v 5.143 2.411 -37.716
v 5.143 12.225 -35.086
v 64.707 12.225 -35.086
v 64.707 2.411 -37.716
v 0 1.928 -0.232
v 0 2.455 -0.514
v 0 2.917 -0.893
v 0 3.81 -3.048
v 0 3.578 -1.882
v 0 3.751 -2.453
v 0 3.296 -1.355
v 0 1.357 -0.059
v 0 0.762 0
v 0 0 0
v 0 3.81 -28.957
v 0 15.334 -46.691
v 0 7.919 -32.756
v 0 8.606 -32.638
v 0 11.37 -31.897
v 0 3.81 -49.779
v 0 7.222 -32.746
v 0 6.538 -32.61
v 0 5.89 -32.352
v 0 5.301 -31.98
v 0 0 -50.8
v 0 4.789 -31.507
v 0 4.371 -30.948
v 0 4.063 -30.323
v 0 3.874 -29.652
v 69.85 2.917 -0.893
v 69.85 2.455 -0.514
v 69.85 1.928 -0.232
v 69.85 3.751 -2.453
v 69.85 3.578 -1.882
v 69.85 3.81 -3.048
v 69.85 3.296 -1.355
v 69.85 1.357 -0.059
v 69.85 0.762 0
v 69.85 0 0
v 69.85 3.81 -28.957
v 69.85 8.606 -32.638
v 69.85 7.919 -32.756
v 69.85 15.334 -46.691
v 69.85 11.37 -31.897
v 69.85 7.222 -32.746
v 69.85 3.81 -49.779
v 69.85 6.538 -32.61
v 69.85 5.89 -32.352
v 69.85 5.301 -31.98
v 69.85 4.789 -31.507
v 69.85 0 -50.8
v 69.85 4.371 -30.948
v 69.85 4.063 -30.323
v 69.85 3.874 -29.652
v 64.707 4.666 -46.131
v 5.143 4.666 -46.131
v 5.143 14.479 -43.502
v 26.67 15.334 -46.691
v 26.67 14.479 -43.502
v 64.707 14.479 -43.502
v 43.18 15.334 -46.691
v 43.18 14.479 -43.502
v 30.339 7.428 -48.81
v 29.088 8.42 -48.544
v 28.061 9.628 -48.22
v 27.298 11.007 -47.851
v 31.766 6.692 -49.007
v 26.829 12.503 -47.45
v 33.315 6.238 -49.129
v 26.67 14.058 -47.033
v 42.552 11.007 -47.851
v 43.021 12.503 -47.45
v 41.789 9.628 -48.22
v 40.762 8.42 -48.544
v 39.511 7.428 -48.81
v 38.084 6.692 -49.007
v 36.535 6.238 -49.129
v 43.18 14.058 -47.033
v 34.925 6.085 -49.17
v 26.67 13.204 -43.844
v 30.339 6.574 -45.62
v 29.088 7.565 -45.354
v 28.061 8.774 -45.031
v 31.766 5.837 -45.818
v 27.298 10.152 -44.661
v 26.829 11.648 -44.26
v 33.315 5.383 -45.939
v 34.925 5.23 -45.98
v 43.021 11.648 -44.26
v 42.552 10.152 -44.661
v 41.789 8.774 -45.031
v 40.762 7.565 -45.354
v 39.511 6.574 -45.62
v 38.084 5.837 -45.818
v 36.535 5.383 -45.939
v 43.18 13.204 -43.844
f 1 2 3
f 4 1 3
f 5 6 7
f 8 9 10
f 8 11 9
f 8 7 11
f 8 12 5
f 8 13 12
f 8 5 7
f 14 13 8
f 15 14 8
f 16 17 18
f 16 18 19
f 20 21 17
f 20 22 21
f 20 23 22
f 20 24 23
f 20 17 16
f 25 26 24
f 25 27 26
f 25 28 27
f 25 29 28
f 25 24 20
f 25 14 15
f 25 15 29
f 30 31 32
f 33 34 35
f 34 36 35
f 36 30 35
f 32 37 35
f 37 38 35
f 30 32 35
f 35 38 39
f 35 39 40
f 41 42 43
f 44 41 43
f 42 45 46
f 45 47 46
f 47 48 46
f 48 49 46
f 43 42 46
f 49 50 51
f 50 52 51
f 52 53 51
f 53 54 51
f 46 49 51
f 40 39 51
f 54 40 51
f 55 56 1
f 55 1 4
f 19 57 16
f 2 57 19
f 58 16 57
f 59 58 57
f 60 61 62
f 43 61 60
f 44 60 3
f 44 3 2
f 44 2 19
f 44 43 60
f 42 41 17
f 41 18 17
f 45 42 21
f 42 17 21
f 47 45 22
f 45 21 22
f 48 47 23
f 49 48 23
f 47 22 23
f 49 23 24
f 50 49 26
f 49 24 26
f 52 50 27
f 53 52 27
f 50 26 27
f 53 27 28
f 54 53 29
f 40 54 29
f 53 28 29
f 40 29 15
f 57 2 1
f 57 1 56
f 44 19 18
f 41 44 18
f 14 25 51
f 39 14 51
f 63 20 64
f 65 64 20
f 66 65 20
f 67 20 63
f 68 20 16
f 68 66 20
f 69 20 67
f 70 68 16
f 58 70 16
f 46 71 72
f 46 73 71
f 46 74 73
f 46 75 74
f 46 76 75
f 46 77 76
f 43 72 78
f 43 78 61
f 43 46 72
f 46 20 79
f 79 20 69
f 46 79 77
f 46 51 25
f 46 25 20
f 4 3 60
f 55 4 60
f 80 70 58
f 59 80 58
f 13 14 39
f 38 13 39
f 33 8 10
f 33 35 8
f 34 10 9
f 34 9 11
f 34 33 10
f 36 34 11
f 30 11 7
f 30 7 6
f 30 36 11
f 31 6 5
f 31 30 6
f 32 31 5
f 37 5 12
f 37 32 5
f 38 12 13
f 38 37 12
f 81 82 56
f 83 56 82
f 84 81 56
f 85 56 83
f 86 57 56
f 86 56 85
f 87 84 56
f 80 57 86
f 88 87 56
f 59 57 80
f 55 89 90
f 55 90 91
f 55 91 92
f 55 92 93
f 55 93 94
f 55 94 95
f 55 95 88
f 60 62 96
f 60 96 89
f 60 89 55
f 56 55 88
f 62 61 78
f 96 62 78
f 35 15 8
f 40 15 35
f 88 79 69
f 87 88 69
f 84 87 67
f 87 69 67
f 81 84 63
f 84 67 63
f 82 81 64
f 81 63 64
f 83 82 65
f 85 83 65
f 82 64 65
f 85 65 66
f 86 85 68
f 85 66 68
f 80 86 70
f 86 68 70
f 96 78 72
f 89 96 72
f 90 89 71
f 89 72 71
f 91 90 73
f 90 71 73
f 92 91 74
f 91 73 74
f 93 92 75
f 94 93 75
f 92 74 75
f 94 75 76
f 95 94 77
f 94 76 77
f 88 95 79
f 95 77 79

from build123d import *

# Parameters (mm, degrees)
SKETCH1_W              = 69.85
SKETCH1_H              = 50.8
BASE_DEPTH             = 3.81
PHONE_SUPPORT_DEPTH    = 69.85
FRONT_FACE_CUT_DEPTH   = 88.719987912
SKETCH4_W              = 59.563
SKETCH4_H              = 8.7122
PHONE_SLOT_DEPTH       = 10.16
HOME_BUTTON_HOLE_REACH = 87.363
FILLET1_R              = 3.81
FILLET2_R              = 3.048


with BuildPart() as part:
    # Sketch1 → Base (new body)
    with BuildSketch(Plane(origin=(0, 0, 0), x_dir=(1, 0, 0), z_dir=(0, 1, 0))):
        with Locations((34.925, 25.4)):
            Rectangle(SKETCH1_W, SKETCH1_H)
    extrude(amount=BASE_DEPTH)

    # Sketch2 → Phone support (add, through all)
    with BuildSketch(Plane(origin=(69.85, 0, 0), x_dir=(0, 0, -1), z_dir=(1, 0, 0))):
        Polygon((33.922616542, 3.81), (49.779113577, 3.81), (46.691247659, 15.334072492), (31.896934518, 11.369948234), align=None)
    extrude(amount=-PHONE_SUPPORT_DEPTH)

    # Sketch3 → Front face cut (cut, through all)
    with BuildSketch(Plane(origin=(69.85, 0, 0), x_dir=(0, 0, -1), z_dir=(1, 0, 0))):
        Polygon((50.8, 0), (49.779113577, 3.81), (50.8, 3.81), align=None)
    extrude(amount=-FRONT_FACE_CUT_DEPTH, mode=Mode.SUBTRACT)

    # Sketch4 → Phone slot (cut)
    with BuildSketch(Plane(origin=(0, 2.634072492, 0.705797597), x_dir=(1, 0, 0), z_dir=(0, 0.96592582628907, 0.2588190451025147))):
        with Locations((34.925, 41.410931975)):
            Rectangle(SKETCH4_W, SKETCH4_H)
    extrude(amount=-PHONE_SLOT_DEPTH, mode=Mode.SUBTRACT)

    # Sketch5 → Home button hole (cut, up to next)
    with BuildSketch(Plane(origin=(0, 12.7, -47.397045256), x_dir=(-1, 0, 0), z_dir=(0, 0.2588190451025147, -0.96592582628907)), mode=Mode.PRIVATE) as home_button_hole_sk1:
        with BuildLine():
            ThreePointArc((-43.17999875, 1.406192509), (-40.762165229, -4.43097397), (-34.92499875, -6.848807491))
            Line((-34.92499875, -6.848807491), (-34.92499875, 1.406192509))
            Line((-34.92499875, 1.406192509), (-43.17999875, 1.406192509))
        make_face()
    home_button_hole_tool1 = extrude(home_button_hole_sk1.sketch, amount=-HOME_BUTTON_HOLE_REACH, mode=Mode.PRIVATE) & part.part
    # Sketch5 → Home button hole (cut, up to next)
    with BuildSketch(Plane(origin=(0, 12.7, -47.397045256), x_dir=(-1, 0, 0), z_dir=(0, 0.2588190451025147, -0.96592582628907)), mode=Mode.PRIVATE) as home_button_hole_sk2:
        with BuildLine():
            Line((-34.92499875, 1.406192509), (-34.92499875, -6.848807491))
            ThreePointArc((-34.92499875, -6.848807491), (-29.087832271, -4.43097397), (-26.66999875, 1.406192509))
            Line((-26.66999875, 1.406192509), (-34.92499875, 1.406192509))
        make_face()
    home_button_hole_tool2 = extrude(home_button_hole_sk2.sketch, amount=-HOME_BUTTON_HOLE_REACH, mode=Mode.PRIVATE) & part.part
    # Sketch5 → Home button hole (cut, up to next)
    with BuildSketch(Plane(origin=(0, 12.7, -47.397045256), x_dir=(-1, 0, 0), z_dir=(0, 0.2588190451025147, -0.96592582628907)), mode=Mode.PRIVATE) as home_button_hole_sk3:
        with BuildLine():
            ThreePointArc((-43.17999875, 1.406192509), (-40.762165229, -4.43097397), (-34.92499875, -6.848807491))
            Line((-34.92499875, -6.848807491), (-34.92499875, 1.406192509))
            Line((-34.92499875, 1.406192509), (-43.17999875, 1.406192509))
        make_face()
    home_button_hole_tool3 = extrude(home_button_hole_sk3.sketch, amount=-HOME_BUTTON_HOLE_REACH, mode=Mode.PRIVATE) & part.part
    # Sketch5 → Home button hole (cut, up to next)
    with BuildSketch(Plane(origin=(0, 12.7, -47.397045256), x_dir=(-1, 0, 0), z_dir=(0, 0.2588190451025147, -0.96592582628907)), mode=Mode.PRIVATE) as home_button_hole_sk4:
        with BuildLine():
            Line((-34.92499875, 1.406192509), (-34.92499875, -6.848807491))
            ThreePointArc((-34.92499875, -6.848807491), (-29.087832271, -4.43097397), (-26.66999875, 1.406192509))
            Line((-26.66999875, 1.406192509), (-34.92499875, 1.406192509))
        make_face()
    home_button_hole_tool4 = extrude(home_button_hole_sk4.sketch, amount=-HOME_BUTTON_HOLE_REACH, mode=Mode.PRIVATE) & part.part
    # Sketch5 → Home button hole (cut, up to next)
    with BuildSketch(Plane(origin=(0, 12.7, -47.397045256), x_dir=(-1, 0, 0), z_dir=(0, 0.2588190451025147, -0.96592582628907)), mode=Mode.PRIVATE) as home_button_hole_sk5:
        with BuildLine():
            Line((-43.17999875, 1.406192509), (-34.92499875, 1.406192509))
            Line((-34.92499875, 1.406192509), (-34.92499875, 2.726992509))
            Line((-34.92499875, 2.726992509), (-43.073649703, 2.726992509))
            ThreePointArc((-43.073649703, 2.726992509), (-43.153368534, 2.068729821), (-43.17999875, 1.406192509))
        make_face()
    home_button_hole_tool5 = extrude(home_button_hole_sk5.sketch, amount=-HOME_BUTTON_HOLE_REACH, mode=Mode.PRIVATE) & part.part
    # Sketch5 → Home button hole (cut, up to next)
    with BuildSketch(Plane(origin=(0, 12.7, -47.397045256), x_dir=(-1, 0, 0), z_dir=(0, 0.2588190451025147, -0.96592582628907)), mode=Mode.PRIVATE) as home_button_hole_sk6:
        with BuildLine():
            Line((-34.92499875, 2.726992509), (-34.92499875, 1.406192509))
            Line((-34.92499875, 1.406192509), (-26.66999875, 1.406192509))
            ThreePointArc((-26.66999875, 1.406192509), (-26.696628966, 2.068729821), (-26.776347797, 2.726992509))
            Line((-26.776347797, 2.726992509), (-34.92499875, 2.726992509))
        make_face()
    home_button_hole_tool6 = extrude(home_button_hole_sk6.sketch, amount=-HOME_BUTTON_HOLE_REACH, mode=Mode.PRIVATE) & part.part
    # Sketch5 → Home button hole (cut, up to next)
    with BuildSketch(Plane(origin=(0, 12.7, -47.397045256), x_dir=(-1, 0, 0), z_dir=(0, 0.2588190451025147, -0.96592582628907)), mode=Mode.PRIVATE) as home_button_hole_sk7:
        with BuildLine():
            Line((-43.17999875, 1.406192509), (-34.92499875, 1.406192509))
            Line((-34.92499875, 1.406192509), (-34.92499875, 2.726992509))
            Line((-34.92499875, 2.726992509), (-43.073649703, 2.726992509))
            ThreePointArc((-43.073649703, 2.726992509), (-43.153368534, 2.068729821), (-43.17999875, 1.406192509))
        make_face()
    home_button_hole_tool7 = extrude(home_button_hole_sk7.sketch, amount=-HOME_BUTTON_HOLE_REACH, mode=Mode.PRIVATE) & part.part
    # Sketch5 → Home button hole (cut, up to next)
    with BuildSketch(Plane(origin=(0, 12.7, -47.397045256), x_dir=(-1, 0, 0), z_dir=(0, 0.2588190451025147, -0.96592582628907)), mode=Mode.PRIVATE) as home_button_hole_sk8:
        with BuildLine():
            Line((-34.92499875, 2.726992509), (-34.92499875, 1.406192509))
            Line((-34.92499875, 1.406192509), (-26.66999875, 1.406192509))
            ThreePointArc((-26.66999875, 1.406192509), (-26.696628966, 2.068729821), (-26.776347797, 2.726992509))
            Line((-26.776347797, 2.726992509), (-34.92499875, 2.726992509))
        make_face()
    home_button_hole_tool8 = extrude(home_button_hole_sk8.sketch, amount=-HOME_BUTTON_HOLE_REACH, mode=Mode.PRIVATE) & part.part
    # Sketch5 → Home button hole (cut, up to next)
    with BuildSketch(Plane(origin=(0, 12.7, -47.397045256), x_dir=(-1, 0, 0), z_dir=(0, 0.2588190451025147, -0.96592582628907)), mode=Mode.PRIVATE) as home_button_hole_sk9:
        with BuildLine():
            Line((-43.17999875, 2.726992509), (-43.17999875, 1.406192509))
            ThreePointArc((-43.17999875, 1.406192509), (-43.153368534, 2.068729821), (-43.073649703, 2.726992509))
            Line((-43.073649703, 2.726992509), (-43.17999875, 2.726992509))
        make_face()
    home_button_hole_tool9 = extrude(home_button_hole_sk9.sketch, amount=-HOME_BUTTON_HOLE_REACH, mode=Mode.PRIVATE) & part.part
    # Sketch5 → Home button hole (cut, up to next)
    with BuildSketch(Plane(origin=(0, 12.7, -47.397045256), x_dir=(-1, 0, 0), z_dir=(0, 0.2588190451025147, -0.96592582628907)), mode=Mode.PRIVATE) as home_button_hole_sk10:
        with BuildLine():
            ThreePointArc((-26.776347797, 2.726992509), (-26.696628966, 2.068729821), (-26.66999875, 1.406192509))
            Line((-26.66999875, 1.406192509), (-26.66999875, 2.726992509))
            Line((-26.66999875, 2.726992509), (-26.776347797, 2.726992509))
        make_face()
    home_button_hole_tool10 = extrude(home_button_hole_sk10.sketch, amount=-HOME_BUTTON_HOLE_REACH, mode=Mode.PRIVATE) & part.part
    add(home_button_hole_tool1.solids().sort_by_distance((38.42853, 10.674127, -47.939876))[0], mode=Mode.SUBTRACT)
    add(home_button_hole_tool2.solids().sort_by_distance((31.421468, 10.674127, -47.939876))[0], mode=Mode.SUBTRACT)
    add(home_button_hole_tool3.solids().sort_by_distance((38.42853, 10.674127, -47.939876))[0], mode=Mode.SUBTRACT)
    add(home_button_hole_tool4.solids().sort_by_distance((31.421468, 10.674127, -47.939876))[0], mode=Mode.SUBTRACT)
    add(home_button_hole_tool5.solids().sort_by_distance((39.034881, 14.694801, -46.86254))[0], mode=Mode.SUBTRACT)
    add(home_button_hole_tool6.solids().sort_by_distance((30.815117, 14.694801, -46.86254))[0], mode=Mode.SUBTRACT)
    add(home_button_hole_tool7.solids().sort_by_distance((39.034881, 14.694801, -46.86254))[0], mode=Mode.SUBTRACT)
    add(home_button_hole_tool8.solids().sort_by_distance((30.815117, 14.694801, -46.86254))[0], mode=Mode.SUBTRACT)
    add(home_button_hole_tool9.solids().sort_by_distance((43.14813, 15.015536, -46.776599))[0], mode=Mode.SUBTRACT)
    add(home_button_hole_tool10.solids().sort_by_distance((26.701868, 15.015536, -46.776599))[0], mode=Mode.SUBTRACT)

    # Fillet1
    fillet1_edges = [part.edges().sort_by_distance(p)[0] for p in [
        (34.925, 3.81, -33.922616542),
    ]]
    fillet(fillet1_edges, radius=FILLET1_R)

    # Fillet2
    fillet2_edges = [part.edges().sort_by_distance(p)[0] for p in [
        (34.925, 3.81, 0),
    ]]
    fillet(fillet2_edges, radius=FILLET2_R)


solid = part.part
